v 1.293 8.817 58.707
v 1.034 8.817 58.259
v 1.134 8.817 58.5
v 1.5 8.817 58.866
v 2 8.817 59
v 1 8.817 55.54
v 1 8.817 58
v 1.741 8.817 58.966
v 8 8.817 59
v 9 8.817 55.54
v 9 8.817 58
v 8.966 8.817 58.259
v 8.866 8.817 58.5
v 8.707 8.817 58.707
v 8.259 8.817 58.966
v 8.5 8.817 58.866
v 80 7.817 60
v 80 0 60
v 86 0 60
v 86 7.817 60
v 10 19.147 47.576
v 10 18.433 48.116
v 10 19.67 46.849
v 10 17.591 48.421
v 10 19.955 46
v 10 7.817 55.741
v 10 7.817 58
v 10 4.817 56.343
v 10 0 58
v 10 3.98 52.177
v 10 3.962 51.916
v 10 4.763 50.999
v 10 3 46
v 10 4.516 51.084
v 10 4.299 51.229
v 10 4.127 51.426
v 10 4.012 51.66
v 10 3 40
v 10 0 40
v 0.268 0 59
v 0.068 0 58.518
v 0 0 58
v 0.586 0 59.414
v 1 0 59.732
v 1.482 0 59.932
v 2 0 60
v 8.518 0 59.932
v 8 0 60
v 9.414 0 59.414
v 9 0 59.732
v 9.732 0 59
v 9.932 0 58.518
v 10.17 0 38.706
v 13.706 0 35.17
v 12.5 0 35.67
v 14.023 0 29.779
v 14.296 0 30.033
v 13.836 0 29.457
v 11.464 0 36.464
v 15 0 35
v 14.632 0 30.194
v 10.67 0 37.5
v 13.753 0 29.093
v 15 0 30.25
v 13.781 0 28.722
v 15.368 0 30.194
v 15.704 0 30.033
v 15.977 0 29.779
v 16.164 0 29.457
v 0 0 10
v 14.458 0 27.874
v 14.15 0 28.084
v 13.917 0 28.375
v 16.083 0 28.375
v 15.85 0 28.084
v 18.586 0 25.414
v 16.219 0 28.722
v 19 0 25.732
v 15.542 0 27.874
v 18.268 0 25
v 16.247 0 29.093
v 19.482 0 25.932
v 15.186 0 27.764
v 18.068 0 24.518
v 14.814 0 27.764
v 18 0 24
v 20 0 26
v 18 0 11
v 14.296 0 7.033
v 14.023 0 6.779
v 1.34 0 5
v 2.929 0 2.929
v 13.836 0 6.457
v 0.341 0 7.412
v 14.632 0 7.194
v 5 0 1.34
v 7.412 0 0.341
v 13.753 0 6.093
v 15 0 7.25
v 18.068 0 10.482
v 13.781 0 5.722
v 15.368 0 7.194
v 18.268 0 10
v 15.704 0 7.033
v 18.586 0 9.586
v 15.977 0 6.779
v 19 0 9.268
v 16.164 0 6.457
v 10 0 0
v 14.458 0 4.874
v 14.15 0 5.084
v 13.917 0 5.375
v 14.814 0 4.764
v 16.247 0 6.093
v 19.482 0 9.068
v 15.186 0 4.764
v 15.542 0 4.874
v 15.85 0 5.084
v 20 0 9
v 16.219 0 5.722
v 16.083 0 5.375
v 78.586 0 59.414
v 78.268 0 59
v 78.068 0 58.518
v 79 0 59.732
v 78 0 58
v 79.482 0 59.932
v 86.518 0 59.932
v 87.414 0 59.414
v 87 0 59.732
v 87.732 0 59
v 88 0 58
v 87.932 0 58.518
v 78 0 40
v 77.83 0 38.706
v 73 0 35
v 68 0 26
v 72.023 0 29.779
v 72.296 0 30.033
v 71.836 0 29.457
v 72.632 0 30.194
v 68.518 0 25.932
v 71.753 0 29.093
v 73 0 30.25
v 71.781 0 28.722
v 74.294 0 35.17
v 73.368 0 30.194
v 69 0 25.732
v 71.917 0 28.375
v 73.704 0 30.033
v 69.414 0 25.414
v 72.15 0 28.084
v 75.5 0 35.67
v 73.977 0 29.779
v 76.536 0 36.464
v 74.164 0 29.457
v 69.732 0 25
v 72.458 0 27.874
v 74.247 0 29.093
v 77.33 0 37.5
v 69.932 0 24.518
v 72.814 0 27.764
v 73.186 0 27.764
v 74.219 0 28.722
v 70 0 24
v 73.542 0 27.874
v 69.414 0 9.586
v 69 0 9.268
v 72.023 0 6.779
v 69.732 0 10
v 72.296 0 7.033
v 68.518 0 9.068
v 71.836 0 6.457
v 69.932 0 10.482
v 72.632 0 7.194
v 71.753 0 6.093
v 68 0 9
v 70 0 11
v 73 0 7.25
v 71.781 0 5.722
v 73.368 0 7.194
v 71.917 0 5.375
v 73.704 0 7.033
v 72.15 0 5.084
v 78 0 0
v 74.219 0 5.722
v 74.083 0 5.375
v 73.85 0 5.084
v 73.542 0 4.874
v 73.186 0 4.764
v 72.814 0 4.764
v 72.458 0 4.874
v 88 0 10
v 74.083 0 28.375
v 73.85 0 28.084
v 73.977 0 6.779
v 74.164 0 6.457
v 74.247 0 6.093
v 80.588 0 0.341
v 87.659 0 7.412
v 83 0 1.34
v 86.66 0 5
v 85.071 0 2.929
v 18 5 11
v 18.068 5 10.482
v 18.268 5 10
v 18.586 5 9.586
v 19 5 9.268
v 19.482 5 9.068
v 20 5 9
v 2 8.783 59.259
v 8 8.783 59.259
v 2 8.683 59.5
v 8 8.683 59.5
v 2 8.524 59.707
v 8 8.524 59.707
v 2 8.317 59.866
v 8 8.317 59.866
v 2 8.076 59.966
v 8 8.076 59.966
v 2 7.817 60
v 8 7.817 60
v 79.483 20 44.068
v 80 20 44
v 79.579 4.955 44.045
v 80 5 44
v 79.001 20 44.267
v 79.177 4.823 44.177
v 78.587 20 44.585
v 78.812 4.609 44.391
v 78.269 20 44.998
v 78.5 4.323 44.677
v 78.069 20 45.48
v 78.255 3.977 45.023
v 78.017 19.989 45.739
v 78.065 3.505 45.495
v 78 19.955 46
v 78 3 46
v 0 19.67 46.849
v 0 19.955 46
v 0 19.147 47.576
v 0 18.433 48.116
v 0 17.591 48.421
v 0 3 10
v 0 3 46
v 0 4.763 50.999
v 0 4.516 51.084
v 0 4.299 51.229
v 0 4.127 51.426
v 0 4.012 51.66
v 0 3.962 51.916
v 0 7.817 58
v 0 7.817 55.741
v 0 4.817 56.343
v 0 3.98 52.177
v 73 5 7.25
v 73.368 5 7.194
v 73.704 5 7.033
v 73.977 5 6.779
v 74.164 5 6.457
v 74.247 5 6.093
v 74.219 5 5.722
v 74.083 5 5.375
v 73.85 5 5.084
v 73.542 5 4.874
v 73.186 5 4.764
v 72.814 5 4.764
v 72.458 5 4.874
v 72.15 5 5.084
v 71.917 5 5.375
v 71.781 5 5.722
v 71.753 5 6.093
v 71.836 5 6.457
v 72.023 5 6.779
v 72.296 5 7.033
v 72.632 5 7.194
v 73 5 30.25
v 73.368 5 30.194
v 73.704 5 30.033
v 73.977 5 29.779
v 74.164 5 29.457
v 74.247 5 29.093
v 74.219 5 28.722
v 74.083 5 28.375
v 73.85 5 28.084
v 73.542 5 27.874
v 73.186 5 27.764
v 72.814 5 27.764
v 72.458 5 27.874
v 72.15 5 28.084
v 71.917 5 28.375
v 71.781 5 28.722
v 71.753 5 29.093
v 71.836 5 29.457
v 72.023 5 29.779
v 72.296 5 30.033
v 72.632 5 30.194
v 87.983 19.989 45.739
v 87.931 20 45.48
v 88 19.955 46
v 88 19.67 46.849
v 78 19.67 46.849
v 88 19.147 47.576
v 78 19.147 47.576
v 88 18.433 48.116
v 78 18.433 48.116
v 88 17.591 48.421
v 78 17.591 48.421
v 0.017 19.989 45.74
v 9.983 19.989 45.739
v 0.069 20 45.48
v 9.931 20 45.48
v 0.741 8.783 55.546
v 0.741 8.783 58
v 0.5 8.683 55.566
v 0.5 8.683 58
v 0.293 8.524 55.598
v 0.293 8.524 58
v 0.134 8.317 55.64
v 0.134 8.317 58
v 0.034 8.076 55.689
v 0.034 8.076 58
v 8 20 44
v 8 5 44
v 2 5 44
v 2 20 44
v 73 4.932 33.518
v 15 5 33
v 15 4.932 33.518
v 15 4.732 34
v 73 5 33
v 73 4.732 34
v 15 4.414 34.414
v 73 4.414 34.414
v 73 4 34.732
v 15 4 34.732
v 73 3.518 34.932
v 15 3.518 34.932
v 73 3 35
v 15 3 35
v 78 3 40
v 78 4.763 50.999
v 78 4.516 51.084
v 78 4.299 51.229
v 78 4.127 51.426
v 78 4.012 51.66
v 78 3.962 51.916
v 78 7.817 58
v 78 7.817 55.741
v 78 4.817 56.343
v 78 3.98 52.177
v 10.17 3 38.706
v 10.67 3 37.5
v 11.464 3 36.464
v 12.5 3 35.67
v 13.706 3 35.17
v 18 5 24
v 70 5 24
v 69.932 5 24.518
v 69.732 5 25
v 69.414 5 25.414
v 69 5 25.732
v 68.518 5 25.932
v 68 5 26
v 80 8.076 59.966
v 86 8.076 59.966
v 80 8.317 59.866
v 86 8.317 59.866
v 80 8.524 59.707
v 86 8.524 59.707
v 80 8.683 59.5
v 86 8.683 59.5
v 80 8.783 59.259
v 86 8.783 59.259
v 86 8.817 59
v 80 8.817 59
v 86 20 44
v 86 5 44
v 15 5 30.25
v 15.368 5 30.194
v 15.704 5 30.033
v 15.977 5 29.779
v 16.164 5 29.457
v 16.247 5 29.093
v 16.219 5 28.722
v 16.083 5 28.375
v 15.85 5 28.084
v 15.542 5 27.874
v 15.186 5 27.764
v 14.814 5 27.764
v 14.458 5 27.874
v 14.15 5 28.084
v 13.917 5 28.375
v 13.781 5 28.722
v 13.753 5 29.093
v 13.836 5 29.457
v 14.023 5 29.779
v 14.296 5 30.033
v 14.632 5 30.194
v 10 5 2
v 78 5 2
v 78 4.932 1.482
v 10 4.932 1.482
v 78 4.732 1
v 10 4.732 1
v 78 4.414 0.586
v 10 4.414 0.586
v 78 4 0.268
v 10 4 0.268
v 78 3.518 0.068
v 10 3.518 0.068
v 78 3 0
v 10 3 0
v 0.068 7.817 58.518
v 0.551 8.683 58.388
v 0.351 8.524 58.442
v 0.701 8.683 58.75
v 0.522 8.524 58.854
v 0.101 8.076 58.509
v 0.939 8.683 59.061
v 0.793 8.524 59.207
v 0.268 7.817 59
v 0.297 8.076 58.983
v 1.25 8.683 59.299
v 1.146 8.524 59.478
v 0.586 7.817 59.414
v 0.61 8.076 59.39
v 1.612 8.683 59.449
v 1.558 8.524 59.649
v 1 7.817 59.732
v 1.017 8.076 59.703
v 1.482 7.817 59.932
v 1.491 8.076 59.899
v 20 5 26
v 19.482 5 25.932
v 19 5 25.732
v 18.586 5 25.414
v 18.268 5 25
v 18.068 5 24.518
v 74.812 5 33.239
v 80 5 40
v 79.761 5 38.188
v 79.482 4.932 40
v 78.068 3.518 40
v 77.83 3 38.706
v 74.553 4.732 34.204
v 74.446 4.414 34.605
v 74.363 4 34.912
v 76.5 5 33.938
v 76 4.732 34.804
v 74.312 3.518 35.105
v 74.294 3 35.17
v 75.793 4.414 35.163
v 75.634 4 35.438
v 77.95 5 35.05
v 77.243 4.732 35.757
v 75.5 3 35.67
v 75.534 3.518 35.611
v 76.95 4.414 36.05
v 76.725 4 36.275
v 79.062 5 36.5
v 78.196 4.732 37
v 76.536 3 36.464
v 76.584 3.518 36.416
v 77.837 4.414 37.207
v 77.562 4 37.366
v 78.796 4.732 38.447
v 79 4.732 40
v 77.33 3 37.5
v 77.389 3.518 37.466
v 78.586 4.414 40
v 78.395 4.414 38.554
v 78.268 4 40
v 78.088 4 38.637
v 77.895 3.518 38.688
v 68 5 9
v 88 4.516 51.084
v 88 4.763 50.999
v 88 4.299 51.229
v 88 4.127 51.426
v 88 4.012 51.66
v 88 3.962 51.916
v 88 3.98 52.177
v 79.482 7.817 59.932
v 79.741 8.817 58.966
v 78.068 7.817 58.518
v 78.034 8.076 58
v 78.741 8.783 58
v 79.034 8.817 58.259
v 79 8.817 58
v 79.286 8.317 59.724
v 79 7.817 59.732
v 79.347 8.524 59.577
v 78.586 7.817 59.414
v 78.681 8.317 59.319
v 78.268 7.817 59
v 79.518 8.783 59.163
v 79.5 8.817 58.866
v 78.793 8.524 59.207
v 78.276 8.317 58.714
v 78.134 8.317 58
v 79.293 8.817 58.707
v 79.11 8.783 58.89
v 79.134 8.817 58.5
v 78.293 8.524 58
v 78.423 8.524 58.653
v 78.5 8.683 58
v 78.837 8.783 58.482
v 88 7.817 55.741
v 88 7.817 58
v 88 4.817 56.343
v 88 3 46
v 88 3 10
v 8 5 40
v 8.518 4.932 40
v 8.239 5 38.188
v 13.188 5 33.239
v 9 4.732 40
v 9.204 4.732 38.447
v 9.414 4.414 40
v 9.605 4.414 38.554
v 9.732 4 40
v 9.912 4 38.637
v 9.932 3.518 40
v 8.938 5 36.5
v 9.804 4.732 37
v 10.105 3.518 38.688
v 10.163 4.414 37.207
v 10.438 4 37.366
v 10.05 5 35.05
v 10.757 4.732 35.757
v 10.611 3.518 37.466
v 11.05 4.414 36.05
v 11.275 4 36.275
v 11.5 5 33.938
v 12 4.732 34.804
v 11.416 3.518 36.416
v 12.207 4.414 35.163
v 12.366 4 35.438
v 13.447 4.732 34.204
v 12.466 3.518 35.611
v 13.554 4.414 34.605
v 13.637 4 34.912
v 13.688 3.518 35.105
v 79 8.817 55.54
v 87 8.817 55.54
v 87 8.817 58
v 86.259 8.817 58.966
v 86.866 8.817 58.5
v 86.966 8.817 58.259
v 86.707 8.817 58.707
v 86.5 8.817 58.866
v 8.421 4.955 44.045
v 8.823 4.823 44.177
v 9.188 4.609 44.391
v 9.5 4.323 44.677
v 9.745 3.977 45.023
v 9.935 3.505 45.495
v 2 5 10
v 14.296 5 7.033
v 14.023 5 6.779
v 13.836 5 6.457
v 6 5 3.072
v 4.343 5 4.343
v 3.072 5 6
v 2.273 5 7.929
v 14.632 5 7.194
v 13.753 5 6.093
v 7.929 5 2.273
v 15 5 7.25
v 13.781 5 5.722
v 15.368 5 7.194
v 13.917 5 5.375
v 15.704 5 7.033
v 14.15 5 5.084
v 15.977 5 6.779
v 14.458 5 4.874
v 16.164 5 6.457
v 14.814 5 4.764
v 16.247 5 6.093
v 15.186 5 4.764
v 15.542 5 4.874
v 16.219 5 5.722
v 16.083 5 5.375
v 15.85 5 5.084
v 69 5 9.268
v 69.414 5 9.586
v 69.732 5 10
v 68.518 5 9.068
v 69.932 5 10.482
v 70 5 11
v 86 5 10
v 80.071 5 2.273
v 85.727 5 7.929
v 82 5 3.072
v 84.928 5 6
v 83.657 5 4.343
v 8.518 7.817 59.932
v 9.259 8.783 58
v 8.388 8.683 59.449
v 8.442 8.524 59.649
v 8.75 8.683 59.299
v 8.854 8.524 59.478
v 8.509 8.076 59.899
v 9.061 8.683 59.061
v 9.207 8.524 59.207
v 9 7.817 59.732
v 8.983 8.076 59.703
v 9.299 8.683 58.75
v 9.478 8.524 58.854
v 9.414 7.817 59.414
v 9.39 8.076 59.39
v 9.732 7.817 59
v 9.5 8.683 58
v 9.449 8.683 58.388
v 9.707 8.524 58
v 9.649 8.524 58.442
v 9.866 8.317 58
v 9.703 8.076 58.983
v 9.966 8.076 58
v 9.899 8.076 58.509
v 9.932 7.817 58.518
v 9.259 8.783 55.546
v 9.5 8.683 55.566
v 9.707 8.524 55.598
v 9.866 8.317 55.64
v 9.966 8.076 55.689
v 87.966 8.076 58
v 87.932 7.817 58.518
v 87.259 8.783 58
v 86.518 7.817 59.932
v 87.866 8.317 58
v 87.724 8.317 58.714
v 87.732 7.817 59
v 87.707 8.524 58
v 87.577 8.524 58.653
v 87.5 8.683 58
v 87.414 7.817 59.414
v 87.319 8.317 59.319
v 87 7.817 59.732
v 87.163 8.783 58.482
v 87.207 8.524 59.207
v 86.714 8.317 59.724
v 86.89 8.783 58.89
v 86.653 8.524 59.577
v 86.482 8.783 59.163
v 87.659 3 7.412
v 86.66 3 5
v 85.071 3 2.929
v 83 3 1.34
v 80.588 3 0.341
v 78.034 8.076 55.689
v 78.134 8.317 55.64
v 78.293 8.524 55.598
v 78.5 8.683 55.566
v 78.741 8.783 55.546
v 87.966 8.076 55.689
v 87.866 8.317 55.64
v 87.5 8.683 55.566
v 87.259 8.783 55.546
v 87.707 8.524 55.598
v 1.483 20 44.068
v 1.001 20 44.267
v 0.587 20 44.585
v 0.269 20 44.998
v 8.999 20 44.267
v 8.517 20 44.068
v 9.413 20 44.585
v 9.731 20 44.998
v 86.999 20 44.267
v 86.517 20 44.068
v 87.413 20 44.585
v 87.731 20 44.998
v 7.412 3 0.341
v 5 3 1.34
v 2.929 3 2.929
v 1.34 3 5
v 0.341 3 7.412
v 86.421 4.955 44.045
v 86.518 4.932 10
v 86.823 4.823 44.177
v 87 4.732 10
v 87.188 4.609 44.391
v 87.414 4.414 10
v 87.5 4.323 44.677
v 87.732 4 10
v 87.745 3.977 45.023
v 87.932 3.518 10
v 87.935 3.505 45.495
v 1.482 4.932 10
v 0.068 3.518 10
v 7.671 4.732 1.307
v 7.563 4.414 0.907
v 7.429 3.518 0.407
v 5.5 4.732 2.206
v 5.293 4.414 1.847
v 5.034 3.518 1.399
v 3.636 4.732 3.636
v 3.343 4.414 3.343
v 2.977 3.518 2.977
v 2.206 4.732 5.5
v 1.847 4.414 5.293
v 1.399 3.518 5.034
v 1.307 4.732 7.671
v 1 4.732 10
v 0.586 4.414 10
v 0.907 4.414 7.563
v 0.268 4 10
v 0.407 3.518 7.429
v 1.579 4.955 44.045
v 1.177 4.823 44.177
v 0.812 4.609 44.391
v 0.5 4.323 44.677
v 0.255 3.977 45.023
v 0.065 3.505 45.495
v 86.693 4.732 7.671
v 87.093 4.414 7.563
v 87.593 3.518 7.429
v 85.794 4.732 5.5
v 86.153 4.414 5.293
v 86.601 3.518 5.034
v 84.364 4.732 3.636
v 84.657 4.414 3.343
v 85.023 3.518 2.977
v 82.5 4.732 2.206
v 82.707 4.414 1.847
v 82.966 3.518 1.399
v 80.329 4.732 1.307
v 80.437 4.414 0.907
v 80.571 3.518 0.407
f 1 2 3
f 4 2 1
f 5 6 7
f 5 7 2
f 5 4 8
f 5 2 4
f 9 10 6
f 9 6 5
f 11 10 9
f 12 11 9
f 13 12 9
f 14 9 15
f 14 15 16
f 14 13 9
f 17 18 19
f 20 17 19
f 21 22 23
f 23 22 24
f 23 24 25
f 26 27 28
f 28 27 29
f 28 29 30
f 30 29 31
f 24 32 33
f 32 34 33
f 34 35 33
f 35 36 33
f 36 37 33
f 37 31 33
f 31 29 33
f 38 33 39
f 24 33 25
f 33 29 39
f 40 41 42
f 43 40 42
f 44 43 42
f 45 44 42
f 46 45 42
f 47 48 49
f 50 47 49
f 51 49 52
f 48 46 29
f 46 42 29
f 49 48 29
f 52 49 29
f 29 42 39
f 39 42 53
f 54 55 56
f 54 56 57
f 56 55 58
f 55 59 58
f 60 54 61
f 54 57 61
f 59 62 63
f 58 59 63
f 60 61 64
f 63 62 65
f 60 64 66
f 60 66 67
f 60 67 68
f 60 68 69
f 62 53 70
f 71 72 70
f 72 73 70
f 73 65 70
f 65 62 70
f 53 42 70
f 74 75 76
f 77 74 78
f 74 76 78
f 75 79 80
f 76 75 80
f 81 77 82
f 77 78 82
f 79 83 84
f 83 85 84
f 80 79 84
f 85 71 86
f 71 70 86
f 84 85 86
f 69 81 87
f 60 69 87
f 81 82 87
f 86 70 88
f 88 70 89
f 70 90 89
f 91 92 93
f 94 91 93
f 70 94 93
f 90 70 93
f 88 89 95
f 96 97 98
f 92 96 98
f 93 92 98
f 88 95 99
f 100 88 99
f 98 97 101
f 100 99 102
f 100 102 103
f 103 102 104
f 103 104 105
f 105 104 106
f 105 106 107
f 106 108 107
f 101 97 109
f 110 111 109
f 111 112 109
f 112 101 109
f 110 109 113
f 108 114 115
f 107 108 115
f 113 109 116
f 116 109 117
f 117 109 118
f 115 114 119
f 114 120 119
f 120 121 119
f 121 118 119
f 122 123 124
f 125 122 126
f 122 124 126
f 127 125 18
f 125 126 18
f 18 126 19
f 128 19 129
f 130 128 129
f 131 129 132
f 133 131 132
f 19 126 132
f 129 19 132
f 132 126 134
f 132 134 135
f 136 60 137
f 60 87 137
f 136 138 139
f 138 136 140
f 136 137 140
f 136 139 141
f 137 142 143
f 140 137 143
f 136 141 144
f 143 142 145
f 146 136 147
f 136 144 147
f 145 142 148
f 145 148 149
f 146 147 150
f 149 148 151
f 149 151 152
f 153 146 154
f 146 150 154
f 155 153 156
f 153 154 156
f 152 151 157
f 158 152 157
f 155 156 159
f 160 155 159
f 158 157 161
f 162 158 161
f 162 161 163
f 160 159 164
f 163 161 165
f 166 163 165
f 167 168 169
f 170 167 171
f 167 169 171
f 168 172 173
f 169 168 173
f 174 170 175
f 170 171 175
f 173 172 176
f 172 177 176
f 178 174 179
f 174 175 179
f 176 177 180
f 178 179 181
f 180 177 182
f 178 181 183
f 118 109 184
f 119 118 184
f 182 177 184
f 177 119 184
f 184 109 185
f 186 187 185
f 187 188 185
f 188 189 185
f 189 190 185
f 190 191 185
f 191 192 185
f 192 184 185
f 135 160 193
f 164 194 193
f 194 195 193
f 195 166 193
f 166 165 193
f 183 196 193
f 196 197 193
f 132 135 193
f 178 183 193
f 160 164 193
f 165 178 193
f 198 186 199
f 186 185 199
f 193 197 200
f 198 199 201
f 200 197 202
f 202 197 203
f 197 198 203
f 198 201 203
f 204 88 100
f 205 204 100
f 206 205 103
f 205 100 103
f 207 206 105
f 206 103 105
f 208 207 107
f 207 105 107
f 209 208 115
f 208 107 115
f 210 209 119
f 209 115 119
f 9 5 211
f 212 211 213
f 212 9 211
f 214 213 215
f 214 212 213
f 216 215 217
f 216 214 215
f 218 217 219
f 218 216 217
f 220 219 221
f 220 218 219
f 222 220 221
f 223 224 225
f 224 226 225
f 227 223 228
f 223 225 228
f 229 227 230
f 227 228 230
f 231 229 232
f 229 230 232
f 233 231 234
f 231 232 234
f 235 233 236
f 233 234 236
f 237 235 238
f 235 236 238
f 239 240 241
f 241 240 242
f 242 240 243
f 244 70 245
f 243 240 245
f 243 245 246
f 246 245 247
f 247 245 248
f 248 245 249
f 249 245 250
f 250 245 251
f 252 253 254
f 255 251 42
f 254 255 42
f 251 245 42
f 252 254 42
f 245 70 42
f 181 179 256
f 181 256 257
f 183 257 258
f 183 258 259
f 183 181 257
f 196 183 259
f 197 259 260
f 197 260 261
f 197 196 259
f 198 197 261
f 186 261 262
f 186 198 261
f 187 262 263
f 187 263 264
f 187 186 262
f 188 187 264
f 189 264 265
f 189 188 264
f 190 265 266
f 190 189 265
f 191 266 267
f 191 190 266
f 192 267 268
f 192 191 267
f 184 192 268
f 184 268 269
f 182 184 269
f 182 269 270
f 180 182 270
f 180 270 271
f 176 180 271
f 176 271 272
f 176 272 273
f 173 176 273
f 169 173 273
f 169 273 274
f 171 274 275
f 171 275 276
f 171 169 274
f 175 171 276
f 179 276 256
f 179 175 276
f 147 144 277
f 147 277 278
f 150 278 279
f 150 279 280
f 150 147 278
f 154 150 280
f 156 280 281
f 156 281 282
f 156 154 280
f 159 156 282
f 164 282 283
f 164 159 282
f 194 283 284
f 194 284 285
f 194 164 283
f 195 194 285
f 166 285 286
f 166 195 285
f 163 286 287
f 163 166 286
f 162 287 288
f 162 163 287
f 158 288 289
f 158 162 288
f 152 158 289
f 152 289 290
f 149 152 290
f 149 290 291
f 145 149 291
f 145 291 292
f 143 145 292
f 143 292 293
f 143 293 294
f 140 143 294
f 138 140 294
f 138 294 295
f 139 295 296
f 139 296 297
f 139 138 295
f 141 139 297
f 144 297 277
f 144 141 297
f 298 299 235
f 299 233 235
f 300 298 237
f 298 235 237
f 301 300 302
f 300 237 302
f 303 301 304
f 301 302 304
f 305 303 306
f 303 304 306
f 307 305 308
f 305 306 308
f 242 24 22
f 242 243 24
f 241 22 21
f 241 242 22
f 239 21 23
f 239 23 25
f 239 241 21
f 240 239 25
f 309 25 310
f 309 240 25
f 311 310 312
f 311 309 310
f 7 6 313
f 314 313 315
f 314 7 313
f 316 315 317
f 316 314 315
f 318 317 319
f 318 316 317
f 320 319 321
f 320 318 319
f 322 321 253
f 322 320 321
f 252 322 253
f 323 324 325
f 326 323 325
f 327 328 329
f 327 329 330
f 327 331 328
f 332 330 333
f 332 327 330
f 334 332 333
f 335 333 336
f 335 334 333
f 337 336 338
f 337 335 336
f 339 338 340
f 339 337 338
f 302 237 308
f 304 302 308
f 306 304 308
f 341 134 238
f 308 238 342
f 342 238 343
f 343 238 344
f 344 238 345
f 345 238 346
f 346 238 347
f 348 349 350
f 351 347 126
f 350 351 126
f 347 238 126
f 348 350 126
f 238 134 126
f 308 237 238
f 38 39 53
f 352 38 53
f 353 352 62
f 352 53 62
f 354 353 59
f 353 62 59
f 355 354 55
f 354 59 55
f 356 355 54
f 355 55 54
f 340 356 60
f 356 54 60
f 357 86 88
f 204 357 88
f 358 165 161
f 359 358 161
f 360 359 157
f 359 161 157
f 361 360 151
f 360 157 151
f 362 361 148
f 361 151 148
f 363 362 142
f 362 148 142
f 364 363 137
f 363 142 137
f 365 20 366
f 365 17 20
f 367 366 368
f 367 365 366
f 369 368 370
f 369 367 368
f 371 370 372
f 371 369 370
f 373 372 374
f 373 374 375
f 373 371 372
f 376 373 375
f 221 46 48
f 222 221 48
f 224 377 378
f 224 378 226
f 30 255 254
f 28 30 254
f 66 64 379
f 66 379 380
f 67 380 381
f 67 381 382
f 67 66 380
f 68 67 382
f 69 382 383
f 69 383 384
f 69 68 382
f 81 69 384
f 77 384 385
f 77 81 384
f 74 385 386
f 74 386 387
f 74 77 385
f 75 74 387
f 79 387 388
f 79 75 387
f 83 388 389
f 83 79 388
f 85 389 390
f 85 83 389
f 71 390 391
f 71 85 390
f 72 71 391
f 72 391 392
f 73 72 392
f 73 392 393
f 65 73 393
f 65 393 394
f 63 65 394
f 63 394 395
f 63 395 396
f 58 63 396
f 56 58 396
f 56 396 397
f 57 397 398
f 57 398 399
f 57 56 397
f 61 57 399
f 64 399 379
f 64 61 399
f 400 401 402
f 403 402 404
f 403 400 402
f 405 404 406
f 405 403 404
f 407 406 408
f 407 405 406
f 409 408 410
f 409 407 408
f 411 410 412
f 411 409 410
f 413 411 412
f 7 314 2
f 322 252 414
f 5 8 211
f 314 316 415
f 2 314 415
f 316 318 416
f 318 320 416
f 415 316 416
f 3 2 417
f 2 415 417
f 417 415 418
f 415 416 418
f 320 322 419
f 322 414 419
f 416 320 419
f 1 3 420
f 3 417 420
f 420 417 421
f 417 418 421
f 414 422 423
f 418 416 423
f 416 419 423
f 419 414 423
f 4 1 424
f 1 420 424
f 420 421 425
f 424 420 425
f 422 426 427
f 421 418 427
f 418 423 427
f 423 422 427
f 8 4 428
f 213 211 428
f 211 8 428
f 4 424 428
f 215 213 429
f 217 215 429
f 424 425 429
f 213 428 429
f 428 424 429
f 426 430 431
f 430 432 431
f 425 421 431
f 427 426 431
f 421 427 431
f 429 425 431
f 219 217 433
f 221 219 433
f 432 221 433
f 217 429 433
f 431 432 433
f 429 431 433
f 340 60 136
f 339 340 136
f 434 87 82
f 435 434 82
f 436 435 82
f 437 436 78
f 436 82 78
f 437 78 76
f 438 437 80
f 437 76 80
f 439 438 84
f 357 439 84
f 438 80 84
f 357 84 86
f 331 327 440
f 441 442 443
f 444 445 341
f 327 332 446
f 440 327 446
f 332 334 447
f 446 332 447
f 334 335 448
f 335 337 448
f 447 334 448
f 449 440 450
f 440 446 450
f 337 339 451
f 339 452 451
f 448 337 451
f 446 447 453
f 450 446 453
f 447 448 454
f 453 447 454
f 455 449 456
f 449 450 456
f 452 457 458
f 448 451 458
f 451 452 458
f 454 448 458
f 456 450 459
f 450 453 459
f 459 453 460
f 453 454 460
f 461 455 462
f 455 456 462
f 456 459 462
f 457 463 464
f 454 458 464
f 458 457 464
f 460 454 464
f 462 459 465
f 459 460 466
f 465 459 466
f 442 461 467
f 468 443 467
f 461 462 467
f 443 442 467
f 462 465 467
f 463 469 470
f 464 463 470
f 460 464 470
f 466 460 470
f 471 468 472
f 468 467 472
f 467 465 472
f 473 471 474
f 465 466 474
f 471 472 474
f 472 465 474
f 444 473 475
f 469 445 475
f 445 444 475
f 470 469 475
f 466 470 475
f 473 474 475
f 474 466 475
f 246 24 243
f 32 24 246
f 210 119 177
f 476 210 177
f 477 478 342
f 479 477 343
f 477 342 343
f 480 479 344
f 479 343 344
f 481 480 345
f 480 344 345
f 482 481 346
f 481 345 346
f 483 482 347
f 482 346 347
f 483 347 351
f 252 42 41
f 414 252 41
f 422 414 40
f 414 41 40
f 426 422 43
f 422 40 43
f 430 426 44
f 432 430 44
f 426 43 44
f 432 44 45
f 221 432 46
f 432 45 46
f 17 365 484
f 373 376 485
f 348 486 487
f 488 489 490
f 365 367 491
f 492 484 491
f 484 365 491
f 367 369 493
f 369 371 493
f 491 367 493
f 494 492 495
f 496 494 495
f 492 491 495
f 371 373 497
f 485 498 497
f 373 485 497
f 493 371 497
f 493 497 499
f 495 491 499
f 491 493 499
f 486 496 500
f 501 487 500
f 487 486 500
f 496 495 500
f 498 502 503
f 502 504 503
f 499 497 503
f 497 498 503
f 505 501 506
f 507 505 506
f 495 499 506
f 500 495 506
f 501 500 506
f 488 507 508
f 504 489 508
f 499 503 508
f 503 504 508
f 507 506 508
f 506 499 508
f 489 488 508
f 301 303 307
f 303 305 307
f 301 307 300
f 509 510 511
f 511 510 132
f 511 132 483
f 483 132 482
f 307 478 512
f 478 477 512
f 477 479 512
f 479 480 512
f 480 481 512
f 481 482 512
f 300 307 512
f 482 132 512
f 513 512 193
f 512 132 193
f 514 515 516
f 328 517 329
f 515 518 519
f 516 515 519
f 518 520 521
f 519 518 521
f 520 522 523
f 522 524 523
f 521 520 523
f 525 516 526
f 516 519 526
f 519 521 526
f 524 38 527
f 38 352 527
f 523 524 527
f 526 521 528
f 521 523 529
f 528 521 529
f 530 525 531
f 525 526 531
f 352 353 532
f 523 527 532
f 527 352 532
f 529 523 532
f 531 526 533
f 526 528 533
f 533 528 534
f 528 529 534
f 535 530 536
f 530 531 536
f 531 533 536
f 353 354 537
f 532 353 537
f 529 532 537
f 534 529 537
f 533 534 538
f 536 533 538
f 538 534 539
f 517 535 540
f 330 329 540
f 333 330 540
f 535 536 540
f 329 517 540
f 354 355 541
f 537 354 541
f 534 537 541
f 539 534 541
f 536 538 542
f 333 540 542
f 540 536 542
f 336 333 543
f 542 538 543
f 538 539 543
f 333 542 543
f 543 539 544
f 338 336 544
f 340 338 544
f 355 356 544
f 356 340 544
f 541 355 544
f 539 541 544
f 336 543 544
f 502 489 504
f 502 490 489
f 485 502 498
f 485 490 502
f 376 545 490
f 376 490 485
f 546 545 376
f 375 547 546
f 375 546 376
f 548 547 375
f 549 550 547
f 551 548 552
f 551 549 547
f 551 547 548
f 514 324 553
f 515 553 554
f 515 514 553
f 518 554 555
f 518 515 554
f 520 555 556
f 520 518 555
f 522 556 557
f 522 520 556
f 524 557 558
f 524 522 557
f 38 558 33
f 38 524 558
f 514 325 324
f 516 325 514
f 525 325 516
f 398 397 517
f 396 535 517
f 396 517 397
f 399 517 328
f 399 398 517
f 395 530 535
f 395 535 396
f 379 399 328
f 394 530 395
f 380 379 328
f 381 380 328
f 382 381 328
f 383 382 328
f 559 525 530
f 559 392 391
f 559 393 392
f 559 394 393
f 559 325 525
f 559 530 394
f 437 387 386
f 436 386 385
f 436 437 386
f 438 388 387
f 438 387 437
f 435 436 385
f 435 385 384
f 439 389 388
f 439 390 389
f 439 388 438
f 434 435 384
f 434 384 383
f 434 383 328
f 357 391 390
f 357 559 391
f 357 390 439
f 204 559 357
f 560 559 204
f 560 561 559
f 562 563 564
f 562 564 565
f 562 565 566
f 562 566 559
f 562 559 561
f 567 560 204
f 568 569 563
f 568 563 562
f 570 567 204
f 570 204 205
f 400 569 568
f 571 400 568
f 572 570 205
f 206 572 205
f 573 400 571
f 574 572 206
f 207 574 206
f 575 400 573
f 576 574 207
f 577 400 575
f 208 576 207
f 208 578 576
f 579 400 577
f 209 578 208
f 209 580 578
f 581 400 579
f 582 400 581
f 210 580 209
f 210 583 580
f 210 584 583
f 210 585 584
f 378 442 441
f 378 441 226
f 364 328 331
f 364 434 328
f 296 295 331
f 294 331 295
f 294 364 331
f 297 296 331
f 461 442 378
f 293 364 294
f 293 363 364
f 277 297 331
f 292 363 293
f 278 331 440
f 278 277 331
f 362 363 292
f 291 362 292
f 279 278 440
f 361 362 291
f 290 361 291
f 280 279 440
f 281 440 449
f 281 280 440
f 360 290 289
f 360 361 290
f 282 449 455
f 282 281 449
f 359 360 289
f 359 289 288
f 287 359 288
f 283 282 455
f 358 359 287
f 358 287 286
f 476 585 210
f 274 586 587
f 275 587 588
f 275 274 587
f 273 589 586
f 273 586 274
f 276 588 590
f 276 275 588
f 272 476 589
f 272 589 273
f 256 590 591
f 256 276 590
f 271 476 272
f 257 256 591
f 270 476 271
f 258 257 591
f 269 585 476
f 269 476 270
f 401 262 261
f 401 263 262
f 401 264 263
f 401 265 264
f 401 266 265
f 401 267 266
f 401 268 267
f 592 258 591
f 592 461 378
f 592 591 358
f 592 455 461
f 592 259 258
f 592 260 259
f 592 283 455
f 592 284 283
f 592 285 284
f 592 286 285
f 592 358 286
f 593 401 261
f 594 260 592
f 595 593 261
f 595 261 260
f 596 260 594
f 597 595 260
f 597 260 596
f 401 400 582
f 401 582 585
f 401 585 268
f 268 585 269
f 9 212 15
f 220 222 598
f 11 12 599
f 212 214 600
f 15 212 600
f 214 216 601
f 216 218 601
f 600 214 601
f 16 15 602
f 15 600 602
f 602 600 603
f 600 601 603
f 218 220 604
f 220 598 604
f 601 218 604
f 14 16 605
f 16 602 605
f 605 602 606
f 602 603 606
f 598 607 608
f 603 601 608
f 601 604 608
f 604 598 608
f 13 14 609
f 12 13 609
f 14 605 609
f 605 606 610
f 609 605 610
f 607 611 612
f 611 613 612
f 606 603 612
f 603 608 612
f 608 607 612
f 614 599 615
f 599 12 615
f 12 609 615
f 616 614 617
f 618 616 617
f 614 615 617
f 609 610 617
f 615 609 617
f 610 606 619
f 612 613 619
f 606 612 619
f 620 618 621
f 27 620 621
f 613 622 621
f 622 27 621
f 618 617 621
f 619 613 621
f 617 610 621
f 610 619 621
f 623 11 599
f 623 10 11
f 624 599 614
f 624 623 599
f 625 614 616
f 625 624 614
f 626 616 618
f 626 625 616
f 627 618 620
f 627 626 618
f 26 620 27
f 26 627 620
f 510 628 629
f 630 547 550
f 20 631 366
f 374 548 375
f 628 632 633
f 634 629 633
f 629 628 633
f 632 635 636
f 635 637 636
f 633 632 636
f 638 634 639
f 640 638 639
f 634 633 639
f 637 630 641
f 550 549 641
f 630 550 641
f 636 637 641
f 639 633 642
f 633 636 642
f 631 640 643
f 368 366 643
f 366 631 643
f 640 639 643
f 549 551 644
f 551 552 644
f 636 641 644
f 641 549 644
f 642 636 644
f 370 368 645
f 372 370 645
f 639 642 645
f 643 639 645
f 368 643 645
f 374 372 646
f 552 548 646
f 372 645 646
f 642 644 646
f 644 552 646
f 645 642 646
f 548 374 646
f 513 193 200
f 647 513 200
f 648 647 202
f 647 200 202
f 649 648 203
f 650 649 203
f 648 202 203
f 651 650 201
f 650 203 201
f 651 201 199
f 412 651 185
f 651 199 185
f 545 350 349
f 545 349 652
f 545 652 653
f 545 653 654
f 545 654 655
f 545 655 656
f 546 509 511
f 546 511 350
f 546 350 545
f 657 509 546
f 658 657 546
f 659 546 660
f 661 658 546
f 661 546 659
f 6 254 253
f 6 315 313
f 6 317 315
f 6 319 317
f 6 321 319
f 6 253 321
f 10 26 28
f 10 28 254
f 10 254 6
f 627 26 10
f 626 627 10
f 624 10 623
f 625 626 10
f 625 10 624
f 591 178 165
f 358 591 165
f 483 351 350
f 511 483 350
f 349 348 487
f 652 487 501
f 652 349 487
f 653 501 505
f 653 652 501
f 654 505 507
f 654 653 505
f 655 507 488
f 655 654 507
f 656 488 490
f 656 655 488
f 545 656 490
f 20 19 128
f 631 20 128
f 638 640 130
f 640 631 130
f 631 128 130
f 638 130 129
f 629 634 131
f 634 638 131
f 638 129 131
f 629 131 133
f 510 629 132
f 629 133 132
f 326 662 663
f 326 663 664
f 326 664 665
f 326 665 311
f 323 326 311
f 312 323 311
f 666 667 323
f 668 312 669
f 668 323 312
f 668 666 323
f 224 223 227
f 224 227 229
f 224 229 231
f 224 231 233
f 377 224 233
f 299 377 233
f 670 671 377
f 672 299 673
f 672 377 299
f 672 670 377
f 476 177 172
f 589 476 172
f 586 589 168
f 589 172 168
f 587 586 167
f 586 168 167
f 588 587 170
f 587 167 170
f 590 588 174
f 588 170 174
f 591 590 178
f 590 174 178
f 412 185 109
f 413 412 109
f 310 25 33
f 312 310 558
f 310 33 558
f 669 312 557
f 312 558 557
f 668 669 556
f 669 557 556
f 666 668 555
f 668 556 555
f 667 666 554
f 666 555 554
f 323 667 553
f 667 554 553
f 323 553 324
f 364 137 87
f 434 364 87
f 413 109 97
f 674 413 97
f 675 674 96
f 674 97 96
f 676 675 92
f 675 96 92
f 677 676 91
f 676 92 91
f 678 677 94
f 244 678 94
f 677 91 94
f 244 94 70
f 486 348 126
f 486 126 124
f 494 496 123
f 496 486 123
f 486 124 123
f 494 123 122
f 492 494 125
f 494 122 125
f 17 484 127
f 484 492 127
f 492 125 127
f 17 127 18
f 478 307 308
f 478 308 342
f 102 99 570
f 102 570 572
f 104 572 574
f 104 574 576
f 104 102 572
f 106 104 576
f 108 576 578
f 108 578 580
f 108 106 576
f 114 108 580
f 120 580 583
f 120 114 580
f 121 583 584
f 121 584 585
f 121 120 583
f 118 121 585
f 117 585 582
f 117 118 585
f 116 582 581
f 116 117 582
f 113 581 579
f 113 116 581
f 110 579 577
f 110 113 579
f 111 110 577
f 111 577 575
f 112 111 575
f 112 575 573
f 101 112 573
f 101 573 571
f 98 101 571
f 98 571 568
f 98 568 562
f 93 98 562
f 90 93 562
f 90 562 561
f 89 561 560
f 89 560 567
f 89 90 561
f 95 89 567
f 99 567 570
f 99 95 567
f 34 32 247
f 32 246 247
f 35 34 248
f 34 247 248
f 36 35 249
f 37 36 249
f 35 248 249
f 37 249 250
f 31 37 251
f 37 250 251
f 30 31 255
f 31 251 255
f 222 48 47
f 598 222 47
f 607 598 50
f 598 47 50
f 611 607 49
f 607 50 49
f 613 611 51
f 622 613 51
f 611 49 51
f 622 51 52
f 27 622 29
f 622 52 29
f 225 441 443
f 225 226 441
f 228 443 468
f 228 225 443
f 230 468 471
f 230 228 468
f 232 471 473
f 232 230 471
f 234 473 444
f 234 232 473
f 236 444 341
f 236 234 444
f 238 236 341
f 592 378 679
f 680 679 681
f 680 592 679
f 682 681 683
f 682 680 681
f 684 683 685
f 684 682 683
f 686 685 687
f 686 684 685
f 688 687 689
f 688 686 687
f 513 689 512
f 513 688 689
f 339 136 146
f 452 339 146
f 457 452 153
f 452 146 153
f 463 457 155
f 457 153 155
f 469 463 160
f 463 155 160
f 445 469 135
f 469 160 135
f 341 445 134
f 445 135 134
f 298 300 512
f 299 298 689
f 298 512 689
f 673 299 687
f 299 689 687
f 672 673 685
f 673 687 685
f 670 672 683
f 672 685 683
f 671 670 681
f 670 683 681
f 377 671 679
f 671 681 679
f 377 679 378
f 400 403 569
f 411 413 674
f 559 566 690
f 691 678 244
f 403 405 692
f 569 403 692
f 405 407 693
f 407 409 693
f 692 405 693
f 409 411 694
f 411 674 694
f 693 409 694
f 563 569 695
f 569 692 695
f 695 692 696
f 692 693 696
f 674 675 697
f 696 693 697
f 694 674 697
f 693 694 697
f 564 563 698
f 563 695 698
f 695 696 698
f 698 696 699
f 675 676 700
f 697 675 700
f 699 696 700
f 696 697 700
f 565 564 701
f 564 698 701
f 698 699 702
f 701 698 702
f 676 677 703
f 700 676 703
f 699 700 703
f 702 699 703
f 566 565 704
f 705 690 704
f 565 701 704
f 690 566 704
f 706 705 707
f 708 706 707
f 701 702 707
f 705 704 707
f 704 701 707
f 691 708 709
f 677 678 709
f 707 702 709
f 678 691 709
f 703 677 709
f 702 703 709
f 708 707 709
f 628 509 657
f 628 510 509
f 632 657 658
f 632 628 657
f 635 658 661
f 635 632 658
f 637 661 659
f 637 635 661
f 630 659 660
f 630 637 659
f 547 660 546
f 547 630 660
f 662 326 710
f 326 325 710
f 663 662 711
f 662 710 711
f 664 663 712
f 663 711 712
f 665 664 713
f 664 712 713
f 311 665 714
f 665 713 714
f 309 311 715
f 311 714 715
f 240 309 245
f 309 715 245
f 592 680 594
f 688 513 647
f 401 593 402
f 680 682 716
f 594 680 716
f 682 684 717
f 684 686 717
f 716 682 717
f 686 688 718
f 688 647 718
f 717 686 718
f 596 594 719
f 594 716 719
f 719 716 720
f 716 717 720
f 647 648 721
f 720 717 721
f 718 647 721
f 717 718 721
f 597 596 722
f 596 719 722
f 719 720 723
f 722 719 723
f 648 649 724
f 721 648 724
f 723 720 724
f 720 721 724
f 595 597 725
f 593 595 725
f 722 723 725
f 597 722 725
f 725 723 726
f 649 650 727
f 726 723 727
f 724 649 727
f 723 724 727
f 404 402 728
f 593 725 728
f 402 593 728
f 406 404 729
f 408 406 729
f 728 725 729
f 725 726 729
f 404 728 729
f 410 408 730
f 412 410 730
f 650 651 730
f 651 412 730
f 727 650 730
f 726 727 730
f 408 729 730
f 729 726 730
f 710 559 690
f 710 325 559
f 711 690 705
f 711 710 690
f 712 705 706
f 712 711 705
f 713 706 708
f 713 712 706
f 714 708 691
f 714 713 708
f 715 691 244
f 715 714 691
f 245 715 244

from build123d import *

# Parameters (mm, degrees)
SKETCH1_R           = 1.2500000000000062
SKETCH1_R_2         = 1.2500000000000029
SKETCH1_R_3         = 1.2499999999999978
SKETCH1_R_4         = 1.2499999999999976
BOSS_EXTRUDE1_DEPTH = 5
BOSS_EXTRUDE2_DEPTH = 20
CUT_EXTRUDE1_DEPTH  = 109.36973747315251
FILLET1_R           = 1
FILLET4_R           = 2
FILLET5_R           = 2
FILLET8_R           = 3
FILLET9_R           = 1


with BuildPart() as part:
    # Sketch1 → Boss-Extrude1 (new body)
    with BuildSketch(Plane(origin=(0, 0, 0), x_dir=(1, 0, 0), z_dir=(0, 1, 0))):
        with BuildLine():
            Line((78, -39.99999999999999), (78, -46))
            ThreePointArc((78, -46), (78.5857864376269, -44.58578643762691), (79.99999999999999, -43.99999999999999))
            Line((79.99999999999999, -44), (85.99999999999999, -44))
            ThreePointArc((85.99999999999999, -44), (87.41421356237308, -44.58578643762691), (87.99999999999999, -46))
            Line((87.99999999999999, -46), (88, -9.999999999999998))
            ThreePointArc((88, -9.999999999999998), (85.07106781186548, -2.9289321881345147), (77.99999999999999, -5.33e-15))
            Line((77.99999999999999, 0), (10.000000000000071, 0))
            ThreePointArc((10.000000000000071, 1.78e-15), (2.9289321881345236, -2.9289321881345245), (0, -10.000000000000071))
            Line((1.22e-15, -10.000000000000071), (5.63e-15, -46))
            ThreePointArc((4.88e-15, -46), (0.5857864376269124, -44.58578643762691), (2.000000000000006, -44))
            Line((2.000000000000006, -44), (8.000000000000005, -44))
            ThreePointArc((8.000000000000005, -44), (9.414213562373103, -44.5857864376269), (10.000000000000007, -46))
            Line((10.000000000000007, -46), (10.000000000000007, -39.99999999999999))
            ThreePointArc((10.000000000000007, -39.99999999999999), (11.46446609406727, -36.464466094067255), (15.000000000000007, -34.99999999999999))
            Line((15.000000000000007, -34.99999999999999), (73, -34.99999999999999))
            ThreePointArc((73, -34.99999999999999), (76.53553390593274, -36.464466094067255), (78, -39.99999999999999))
        make_face()
        with Locations((15.000000000000002, -28.999999999999996)):
            Circle(SKETCH1_R, mode=Mode.SUBTRACT)
        with Locations((14.999999999999998, -6)):
            Circle(SKETCH1_R_2, mode=Mode.SUBTRACT)
        with BuildLine():
            ThreePointArc((17.999999999999996, -11.000000000000004), (18.5857864376269, -9.585786437626908), (19.999999999999996, -9))
            Line((19.999999999999996, -9), (68, -9))
            ThreePointArc((68, -9.000000000000005), (69.41421356237309, -9.58578643762691), (70, -11.000000000000004))
            Line((70, -11.000000000000004), (70, -24))
            ThreePointArc((70, -24), (69.41421356237309, -25.414213562373092), (68, -25.999999999999996))
            Line((68, -26.000000000000004), (19.999999999999996, -26))
            ThreePointArc((19.999999999999996, -26), (18.585786437626908, -25.41421356237309), (18.000000000000004, -24))
            Line((18.000000000000004, -24), (17.999999999999996, -11.000000000000004))
        make_face(mode=Mode.SUBTRACT)
        with Locations((73.00000000000001, -28.999999999999993)):
            Circle(SKETCH1_R_3, mode=Mode.SUBTRACT)
        with Locations((73.00000000000001, -6)):
            Circle(SKETCH1_R_4, mode=Mode.SUBTRACT)
    extrude(amount=BOSS_EXTRUDE1_DEPTH)

    # Sketch1<3> → Boss-Extrude2 (add)
    with BuildSketch(Plane(origin=(0, 0, 0), x_dir=(1, 0, 0), z_dir=(0, 1, 0))):
        with BuildLine():
            ThreePointArc((78, -57.99999999999999), (78.5857864376269, -59.41421356237309), (80, -60))
            Line((80, -60), (86, -60))
            ThreePointArc((86, -60), (87.41421356237309, -59.4142135623731), (87.99999999999999, -57.99999999999999))
            Line((87.99999999999999, -57.99999999999999), (87.99999999999999, -46))
            ThreePointArc((87.99999999999999, -46), (87.41421356237308, -44.58578643762691), (85.99999999999999, -44))
            Line((85.99999999999999, -44), (79.99999999999999, -44))
            ThreePointArc((79.99999999999999, -43.99999999999999), (78.5857864376269, -44.58578643762691), (78, -46))
            Line((78, -46), (78, -57.99999999999999))
        make_face()
        with BuildLine():
            Line((10.000000000000007, -57.99999999999998), (10.000000000000007, -46))
            ThreePointArc((10.000000000000007, -46), (9.414213562373103, -44.5857864376269), (8.000000000000005, -44))
            Line((8.000000000000005, -44), (2.000000000000006, -44))
            ThreePointArc((2.000000000000006, -44), (0.5857864376269124, -44.58578643762691), (4.88e-15, -46))
            Line((5.63e-15, -46), (7.1e-15, -57.99999999999998))
            ThreePointArc((7.99e-15, -57.99999999999998), (0.5857864376269144, -59.414213562373085), (2.0000000000000218, -60))
            Line((2.0000000000000218, -60), (7.999999999999993, -60))
            ThreePointArc((7.999999999999993, -60), (9.4142135623731, -59.414213562373085), (10.000000000000007, -57.99999999999998))
        make_face()
    extrude(amount=BOSS_EXTRUDE2_DEPTH)

    # Sketch2 → Cut-Extrude1 (cut, through all)
    with BuildSketch(Plane(origin=(88, 0, 2.544e-14), x_dir=(-2.9e-16, 0, -1), z_dir=(1, 0, -2.9e-16))):
        Polygon((-60.00000000000003, 20), (-59.99999999999998, 8.816905616081954), (-55.53957096656065, 8.816905616081954), (-56.34341854385401, 4.816905616081951), (-51.19632430540917, 3.782535807663335), (-47.93723198019628, 20), align=None)
    extrude(amount=-CUT_EXTRUDE1_DEPTH, mode=Mode.SUBTRACT)

    # Fillet1
    fillet1_edges = [part.edges().sort_by_distance(p)[0] for p in [
        (1.038e-14, 8.816905616081954, 56.769785483280344),
        (10.00000000000001, 8.816905616081954, 56.76978548328034),
        (9.4142135623731, 8.816905616081954, 59.414213562373085),
        (5.000000000000014, 8.816905616081954, 60.00000000000003),
        (0.585786437626916, 8.816905616081954, 59.414213562373085),
        (78, 8.816905616081954, 56.76978548328034),
        (78.5857864376269, 8.816905616081954, 59.4142135623731),
        (88.00000000000001, 8.816905616081954, 56.76978548328034),
        (87.41421356237309, 8.816905616081954, 59.41421356237309),
        (83, 8.816905616081954, 60.00000000000001),
    ]]
    fillet(fillet1_edges, radius=FILLET1_R)

    # Fillet4
    fillet4_edges = [part.edges().sort_by_distance(p)[0] for p in [
        (88, 5, 28),
        (85.07106781186548, 5, 2.928932188134512),
        (44.00000000000003, 5, 0),
        (2.9289321881345245, 5, 2.9289321881345236),
        (3.43e-15, 5, 28.000000000000036),
    ]]
    fillet(fillet4_edges, radius=FILLET4_R)

    # Fillet5
    fillet5_edges = [part.edges().sort_by_distance(p)[0] for p in [
        (10.000000000000007, 5, 43),
        (11.46446609406727, 5, 36.464466094067255),
        (78, 5, 43),
        (76.53553390593274, 5, 36.464466094067255),
        (44, 5, 34.99999999999999),
    ]]
    fillet(fillet5_edges, radius=FILLET5_R)

    # Fillet8
    fillet8_edges = [part.edges().sort_by_distance(p)[0] for p in [
        (83, 20, 47.93723198019631),
        (5.000000000000014, 20, 47.93723198019633),
    ]]
    fillet(fillet8_edges, radius=FILLET8_R)

    # Fillet9
    fillet9_edges = [part.edges().sort_by_distance(p)[0] for p in [
        (83, 3.782535807663335, 51.1963243054092),
        (5.000000000000014, 3.782535807663335, 51.19632430540922),
    ]]
    fillet(fillet9_edges, radius=FILLET9_R)


solid = part.part
